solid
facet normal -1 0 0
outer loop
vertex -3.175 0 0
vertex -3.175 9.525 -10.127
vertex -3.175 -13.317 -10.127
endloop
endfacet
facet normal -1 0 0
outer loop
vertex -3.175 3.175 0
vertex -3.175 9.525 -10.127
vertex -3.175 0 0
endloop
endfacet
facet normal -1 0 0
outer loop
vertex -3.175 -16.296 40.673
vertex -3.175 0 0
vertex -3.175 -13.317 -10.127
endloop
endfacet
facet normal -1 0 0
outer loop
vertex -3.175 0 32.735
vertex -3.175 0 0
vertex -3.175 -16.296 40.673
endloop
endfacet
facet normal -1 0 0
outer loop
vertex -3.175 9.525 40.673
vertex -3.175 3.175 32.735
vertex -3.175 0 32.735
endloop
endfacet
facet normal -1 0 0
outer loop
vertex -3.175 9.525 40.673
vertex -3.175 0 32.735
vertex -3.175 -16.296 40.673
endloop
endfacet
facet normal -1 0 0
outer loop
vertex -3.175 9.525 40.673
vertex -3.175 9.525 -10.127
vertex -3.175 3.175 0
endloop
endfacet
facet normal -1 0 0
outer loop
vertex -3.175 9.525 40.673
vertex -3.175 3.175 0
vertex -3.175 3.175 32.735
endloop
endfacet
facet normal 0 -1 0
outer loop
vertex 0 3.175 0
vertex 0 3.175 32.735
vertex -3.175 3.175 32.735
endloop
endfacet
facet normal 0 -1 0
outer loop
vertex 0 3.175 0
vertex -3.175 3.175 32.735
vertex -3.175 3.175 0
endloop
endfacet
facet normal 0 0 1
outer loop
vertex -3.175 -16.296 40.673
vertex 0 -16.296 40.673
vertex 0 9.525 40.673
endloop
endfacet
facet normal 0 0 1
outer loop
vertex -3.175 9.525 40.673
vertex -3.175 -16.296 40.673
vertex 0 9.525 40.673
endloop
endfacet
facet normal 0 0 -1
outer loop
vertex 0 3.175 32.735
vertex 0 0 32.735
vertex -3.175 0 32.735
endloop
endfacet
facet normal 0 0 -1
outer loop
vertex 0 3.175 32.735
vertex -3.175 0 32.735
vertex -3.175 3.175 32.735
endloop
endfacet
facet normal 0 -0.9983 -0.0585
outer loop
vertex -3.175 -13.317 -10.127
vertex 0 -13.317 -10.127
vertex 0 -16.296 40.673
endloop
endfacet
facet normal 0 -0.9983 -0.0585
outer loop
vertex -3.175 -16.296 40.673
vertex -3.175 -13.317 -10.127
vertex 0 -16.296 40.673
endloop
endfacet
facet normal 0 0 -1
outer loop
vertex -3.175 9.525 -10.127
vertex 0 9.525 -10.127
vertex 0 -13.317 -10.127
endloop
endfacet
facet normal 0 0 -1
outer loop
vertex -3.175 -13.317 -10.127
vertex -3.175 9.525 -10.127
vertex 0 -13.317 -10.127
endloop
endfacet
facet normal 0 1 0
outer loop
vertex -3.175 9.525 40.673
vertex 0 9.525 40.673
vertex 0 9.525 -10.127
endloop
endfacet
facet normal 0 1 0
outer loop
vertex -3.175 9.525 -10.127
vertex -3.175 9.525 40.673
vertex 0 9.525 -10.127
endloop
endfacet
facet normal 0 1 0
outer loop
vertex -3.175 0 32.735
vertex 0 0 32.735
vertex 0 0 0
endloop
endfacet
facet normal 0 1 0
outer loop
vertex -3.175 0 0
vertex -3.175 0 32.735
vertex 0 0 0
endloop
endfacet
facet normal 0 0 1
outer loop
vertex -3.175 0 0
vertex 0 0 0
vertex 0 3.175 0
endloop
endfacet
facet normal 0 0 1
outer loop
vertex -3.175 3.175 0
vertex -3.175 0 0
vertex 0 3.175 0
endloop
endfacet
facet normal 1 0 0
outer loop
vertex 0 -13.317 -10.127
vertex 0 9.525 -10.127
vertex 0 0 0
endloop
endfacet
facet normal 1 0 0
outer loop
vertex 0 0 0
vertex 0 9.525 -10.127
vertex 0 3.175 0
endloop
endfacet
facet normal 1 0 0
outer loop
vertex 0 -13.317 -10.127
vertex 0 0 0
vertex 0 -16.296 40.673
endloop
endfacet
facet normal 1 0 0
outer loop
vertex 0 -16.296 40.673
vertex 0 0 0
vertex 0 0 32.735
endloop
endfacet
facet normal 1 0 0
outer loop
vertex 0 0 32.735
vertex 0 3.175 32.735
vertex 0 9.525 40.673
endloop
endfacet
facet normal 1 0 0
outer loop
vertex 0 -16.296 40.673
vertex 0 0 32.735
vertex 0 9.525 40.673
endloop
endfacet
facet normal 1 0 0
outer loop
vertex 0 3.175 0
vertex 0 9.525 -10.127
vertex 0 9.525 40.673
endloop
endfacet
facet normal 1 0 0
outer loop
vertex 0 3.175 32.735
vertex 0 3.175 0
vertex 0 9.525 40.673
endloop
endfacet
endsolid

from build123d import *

# Parameters (mm, degrees)
SKETCH1_W           = 32.735153169
SKETCH1_H           = 3.175
BOSS_EXTRUDE1_DEPTH = 3.175


with BuildPart() as part:
    # Sketch1 → Boss-Extrude1 (new body)
    with BuildSketch(Plane(origin=(0, 0, 0), x_dir=(0, 0, -1), z_dir=(1, 0, 0))):
        Polygon((-40.672653169, 9.525), (10.127346831, 9.525), (10.127346831, -13.316680621), (-40.672653169, -16.296041968), align=None)
        with Locations((-16.367576585, 1.5875)):
            Rectangle(SKETCH1_W, SKETCH1_H, mode=Mode.SUBTRACT)
    extrude(amount=-BOSS_EXTRUDE1_DEPTH)


solid = part.part
